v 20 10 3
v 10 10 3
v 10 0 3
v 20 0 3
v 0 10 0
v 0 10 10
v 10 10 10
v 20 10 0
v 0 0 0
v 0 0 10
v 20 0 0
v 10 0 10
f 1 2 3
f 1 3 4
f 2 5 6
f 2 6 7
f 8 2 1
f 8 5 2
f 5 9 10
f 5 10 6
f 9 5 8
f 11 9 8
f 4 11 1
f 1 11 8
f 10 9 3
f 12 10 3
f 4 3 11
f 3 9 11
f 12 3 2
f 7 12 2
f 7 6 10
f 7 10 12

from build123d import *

# Parameters (mm, degrees)
BOX_W        = 10
BOX_H        = 10
BOX_DEPTH    = 10
BOX001_W     = 10
BOX001_H     = 10
BOX001_DEPTH = 3


with BuildPart() as cube:
    # Box → Box (new body)
    with BuildSketch(Plane.XY):
        with Locations((5, 5)):
            Rectangle(BOX_W, BOX_H)
    extrude(amount=BOX_DEPTH)


with BuildPart() as fusion:
    # Box001 → Box001 (new body)
    with BuildSketch(Plane(origin=(10, 0, 0), x_dir=(1, 0, 0), z_dir=(0, 0, 1))):
        with Locations((5, 5)):
            Rectangle(BOX001_W, BOX001_H)
    extrude(amount=BOX001_DEPTH)

    # Fusion: union Cube
    add(cube.part)


solid = fusion.part
